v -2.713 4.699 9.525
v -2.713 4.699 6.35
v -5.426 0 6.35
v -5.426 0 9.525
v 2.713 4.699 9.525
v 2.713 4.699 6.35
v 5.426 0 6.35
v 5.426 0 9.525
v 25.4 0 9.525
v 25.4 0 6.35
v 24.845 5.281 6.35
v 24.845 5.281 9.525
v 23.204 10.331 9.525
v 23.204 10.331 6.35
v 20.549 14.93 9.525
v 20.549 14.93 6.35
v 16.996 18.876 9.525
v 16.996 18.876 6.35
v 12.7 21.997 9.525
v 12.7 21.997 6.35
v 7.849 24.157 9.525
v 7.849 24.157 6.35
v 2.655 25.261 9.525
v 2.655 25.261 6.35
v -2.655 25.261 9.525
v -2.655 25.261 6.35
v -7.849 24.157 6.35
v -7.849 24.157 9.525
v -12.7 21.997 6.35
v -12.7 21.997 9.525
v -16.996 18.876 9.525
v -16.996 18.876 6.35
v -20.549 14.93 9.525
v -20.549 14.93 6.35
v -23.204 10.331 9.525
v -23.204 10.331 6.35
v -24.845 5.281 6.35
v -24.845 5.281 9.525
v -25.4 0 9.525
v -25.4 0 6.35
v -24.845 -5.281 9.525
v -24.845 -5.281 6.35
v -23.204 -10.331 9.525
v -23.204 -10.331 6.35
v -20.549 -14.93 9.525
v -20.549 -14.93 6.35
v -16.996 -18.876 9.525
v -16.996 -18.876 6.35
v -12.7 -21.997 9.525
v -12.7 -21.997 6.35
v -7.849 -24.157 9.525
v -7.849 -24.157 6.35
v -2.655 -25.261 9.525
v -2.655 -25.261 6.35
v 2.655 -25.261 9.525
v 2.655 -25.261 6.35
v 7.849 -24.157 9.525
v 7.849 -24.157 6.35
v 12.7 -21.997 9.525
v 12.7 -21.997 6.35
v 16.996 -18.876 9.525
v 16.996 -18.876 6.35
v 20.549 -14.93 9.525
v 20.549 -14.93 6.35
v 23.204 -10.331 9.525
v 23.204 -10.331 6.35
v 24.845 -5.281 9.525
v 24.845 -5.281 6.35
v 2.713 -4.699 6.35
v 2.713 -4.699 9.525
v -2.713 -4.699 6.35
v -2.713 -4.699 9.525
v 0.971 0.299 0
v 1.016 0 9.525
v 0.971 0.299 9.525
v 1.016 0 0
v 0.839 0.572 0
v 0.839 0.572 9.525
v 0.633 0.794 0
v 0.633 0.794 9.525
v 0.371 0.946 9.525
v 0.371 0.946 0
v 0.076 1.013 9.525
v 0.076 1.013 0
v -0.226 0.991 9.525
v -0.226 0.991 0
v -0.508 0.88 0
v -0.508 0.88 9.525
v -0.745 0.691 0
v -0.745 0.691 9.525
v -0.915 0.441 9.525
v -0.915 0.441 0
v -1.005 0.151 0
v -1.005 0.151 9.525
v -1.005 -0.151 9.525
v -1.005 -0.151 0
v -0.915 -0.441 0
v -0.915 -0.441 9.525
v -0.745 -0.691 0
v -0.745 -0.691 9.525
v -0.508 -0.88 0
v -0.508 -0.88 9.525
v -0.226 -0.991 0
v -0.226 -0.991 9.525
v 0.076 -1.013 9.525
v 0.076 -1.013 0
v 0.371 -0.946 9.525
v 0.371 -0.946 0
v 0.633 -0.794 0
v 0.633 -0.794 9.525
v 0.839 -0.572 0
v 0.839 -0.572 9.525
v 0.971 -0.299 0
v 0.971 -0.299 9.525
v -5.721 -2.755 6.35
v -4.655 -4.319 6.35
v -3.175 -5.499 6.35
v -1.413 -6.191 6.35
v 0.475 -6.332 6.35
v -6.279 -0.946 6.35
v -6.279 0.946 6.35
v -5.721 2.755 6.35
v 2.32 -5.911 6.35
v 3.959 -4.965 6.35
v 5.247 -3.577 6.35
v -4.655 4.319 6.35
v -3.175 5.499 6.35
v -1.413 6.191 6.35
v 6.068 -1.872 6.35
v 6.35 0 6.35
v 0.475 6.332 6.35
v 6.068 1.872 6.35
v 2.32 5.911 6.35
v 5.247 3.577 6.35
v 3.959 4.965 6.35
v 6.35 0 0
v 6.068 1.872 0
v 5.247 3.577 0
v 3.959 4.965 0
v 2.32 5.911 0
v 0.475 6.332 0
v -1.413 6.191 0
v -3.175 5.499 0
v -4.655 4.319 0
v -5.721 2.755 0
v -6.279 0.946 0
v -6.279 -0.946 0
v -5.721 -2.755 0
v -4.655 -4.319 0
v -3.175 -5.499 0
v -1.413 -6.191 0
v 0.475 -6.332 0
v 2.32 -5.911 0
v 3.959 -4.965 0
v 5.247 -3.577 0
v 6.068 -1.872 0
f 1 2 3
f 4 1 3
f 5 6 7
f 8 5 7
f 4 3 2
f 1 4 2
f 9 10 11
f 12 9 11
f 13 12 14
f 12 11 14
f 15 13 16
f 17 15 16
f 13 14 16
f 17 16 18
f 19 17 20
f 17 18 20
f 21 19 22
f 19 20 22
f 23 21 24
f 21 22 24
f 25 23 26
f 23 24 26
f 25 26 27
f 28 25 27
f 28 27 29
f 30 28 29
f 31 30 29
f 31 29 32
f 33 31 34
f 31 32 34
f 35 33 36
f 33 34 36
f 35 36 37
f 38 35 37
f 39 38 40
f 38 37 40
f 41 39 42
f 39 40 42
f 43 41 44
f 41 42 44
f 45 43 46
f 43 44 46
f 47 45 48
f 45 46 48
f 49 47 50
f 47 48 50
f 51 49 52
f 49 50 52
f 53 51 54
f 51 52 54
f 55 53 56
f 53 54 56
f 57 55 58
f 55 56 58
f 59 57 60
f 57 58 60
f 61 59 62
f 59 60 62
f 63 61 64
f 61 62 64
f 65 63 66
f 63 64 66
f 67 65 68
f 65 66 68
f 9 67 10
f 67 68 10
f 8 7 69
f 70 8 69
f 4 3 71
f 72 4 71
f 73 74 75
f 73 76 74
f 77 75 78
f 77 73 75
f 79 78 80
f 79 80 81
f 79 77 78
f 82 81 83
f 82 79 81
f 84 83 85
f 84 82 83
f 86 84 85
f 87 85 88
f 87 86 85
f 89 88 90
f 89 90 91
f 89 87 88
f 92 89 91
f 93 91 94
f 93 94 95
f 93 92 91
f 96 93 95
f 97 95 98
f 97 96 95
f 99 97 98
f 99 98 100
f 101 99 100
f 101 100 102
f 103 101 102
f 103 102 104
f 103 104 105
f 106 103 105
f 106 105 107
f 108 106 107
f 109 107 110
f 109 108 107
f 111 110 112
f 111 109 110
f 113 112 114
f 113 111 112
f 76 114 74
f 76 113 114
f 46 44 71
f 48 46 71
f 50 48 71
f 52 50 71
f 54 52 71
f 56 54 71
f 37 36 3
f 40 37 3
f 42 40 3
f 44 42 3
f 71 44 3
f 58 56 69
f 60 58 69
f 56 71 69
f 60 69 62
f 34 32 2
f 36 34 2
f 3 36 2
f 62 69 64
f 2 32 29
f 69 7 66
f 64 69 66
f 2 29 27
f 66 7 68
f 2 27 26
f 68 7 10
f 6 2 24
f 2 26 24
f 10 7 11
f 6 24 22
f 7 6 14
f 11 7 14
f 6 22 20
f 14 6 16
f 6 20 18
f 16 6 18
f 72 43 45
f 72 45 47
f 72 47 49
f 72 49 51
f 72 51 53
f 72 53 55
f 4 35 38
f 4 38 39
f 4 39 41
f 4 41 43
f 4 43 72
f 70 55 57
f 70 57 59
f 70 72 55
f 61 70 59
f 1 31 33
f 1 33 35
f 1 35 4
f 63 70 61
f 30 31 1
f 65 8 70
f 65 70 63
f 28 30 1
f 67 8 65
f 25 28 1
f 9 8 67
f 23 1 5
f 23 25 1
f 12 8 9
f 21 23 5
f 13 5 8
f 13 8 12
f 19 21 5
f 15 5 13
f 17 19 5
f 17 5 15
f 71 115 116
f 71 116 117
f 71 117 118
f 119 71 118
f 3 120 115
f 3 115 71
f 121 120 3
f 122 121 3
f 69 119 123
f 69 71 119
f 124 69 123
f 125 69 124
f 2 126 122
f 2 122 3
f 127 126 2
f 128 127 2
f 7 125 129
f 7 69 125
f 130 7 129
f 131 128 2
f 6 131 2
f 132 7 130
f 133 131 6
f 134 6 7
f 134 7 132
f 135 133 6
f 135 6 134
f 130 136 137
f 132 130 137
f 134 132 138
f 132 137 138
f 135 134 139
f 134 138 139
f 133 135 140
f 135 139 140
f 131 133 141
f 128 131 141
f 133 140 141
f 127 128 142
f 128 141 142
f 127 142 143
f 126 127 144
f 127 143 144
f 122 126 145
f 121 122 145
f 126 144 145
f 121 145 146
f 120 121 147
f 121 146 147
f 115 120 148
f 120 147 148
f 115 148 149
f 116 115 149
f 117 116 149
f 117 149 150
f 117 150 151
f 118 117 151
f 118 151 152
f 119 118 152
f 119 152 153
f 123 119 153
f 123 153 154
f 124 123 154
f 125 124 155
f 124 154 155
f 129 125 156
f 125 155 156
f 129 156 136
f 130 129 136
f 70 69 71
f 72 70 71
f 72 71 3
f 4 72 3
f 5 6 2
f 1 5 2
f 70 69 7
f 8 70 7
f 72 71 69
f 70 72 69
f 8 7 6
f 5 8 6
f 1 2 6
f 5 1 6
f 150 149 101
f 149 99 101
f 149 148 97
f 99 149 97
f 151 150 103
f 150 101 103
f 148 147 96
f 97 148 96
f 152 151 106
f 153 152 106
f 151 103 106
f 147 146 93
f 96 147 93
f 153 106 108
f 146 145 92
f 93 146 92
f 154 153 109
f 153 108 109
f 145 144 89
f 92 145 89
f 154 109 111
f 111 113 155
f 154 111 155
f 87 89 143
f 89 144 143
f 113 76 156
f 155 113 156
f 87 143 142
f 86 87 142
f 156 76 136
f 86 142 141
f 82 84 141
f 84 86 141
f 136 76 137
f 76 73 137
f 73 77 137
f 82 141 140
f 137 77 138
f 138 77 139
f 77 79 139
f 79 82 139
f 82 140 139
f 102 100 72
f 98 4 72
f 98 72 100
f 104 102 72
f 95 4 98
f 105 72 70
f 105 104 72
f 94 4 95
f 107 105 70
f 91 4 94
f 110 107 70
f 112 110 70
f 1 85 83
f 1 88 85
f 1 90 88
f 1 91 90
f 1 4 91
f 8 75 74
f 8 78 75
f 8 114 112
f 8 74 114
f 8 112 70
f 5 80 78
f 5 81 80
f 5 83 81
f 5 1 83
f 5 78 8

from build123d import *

# Parameters (mm, degrees)
F0_R     = 6.35
F0_R_2   = 1.016
F1_DEPTH = 6.35
F2_R     = 1.016
F3_DEPTH = 3.175
F4_R     = 25.4
F4_R_2   = 6.35
F5_DEPTH = 3.175


with BuildPart() as f1:
    # F0 (on Top) → F1 (new body)
    with BuildSketch(Plane.XY):
        Circle(F0_R)
        Circle(F0_R_2, mode=Mode.SUBTRACT)
    extrude(amount=F1_DEPTH)

    # F2 (on face) → F3 (join)
    with BuildSketch(Plane.XY.offset(6.35)):
        Polygon((2.7129689149, 4.699), (-2.7129689149, 4.699), (-5.4259378298, 0), (-2.7129689149, -4.699), (2.7129689149, -4.699), (5.4259378298, 0), align=None)
        Circle(F2_R, mode=Mode.SUBTRACT)
    extrude(amount=F3_DEPTH)


with BuildPart() as f5:
    # F4 (on face) → F5 (new body, through all)
    with BuildSketch(Plane.XY.offset(6.35)):
        Circle(F4_R)
        Circle(F4_R_2, mode=Mode.SUBTRACT)
        Circle(F4_R_2)
        Polygon((-5.4259378298, 0), (-2.7129689149, 4.699), (2.7129689149, 4.699), (5.4259378298, 0), (2.7129689149, -4.699), (-2.7129689149, -4.699), align=None, mode=Mode.SUBTRACT)
    extrude(amount=F5_DEPTH)


solid = Compound([f1.part, f5.part])
